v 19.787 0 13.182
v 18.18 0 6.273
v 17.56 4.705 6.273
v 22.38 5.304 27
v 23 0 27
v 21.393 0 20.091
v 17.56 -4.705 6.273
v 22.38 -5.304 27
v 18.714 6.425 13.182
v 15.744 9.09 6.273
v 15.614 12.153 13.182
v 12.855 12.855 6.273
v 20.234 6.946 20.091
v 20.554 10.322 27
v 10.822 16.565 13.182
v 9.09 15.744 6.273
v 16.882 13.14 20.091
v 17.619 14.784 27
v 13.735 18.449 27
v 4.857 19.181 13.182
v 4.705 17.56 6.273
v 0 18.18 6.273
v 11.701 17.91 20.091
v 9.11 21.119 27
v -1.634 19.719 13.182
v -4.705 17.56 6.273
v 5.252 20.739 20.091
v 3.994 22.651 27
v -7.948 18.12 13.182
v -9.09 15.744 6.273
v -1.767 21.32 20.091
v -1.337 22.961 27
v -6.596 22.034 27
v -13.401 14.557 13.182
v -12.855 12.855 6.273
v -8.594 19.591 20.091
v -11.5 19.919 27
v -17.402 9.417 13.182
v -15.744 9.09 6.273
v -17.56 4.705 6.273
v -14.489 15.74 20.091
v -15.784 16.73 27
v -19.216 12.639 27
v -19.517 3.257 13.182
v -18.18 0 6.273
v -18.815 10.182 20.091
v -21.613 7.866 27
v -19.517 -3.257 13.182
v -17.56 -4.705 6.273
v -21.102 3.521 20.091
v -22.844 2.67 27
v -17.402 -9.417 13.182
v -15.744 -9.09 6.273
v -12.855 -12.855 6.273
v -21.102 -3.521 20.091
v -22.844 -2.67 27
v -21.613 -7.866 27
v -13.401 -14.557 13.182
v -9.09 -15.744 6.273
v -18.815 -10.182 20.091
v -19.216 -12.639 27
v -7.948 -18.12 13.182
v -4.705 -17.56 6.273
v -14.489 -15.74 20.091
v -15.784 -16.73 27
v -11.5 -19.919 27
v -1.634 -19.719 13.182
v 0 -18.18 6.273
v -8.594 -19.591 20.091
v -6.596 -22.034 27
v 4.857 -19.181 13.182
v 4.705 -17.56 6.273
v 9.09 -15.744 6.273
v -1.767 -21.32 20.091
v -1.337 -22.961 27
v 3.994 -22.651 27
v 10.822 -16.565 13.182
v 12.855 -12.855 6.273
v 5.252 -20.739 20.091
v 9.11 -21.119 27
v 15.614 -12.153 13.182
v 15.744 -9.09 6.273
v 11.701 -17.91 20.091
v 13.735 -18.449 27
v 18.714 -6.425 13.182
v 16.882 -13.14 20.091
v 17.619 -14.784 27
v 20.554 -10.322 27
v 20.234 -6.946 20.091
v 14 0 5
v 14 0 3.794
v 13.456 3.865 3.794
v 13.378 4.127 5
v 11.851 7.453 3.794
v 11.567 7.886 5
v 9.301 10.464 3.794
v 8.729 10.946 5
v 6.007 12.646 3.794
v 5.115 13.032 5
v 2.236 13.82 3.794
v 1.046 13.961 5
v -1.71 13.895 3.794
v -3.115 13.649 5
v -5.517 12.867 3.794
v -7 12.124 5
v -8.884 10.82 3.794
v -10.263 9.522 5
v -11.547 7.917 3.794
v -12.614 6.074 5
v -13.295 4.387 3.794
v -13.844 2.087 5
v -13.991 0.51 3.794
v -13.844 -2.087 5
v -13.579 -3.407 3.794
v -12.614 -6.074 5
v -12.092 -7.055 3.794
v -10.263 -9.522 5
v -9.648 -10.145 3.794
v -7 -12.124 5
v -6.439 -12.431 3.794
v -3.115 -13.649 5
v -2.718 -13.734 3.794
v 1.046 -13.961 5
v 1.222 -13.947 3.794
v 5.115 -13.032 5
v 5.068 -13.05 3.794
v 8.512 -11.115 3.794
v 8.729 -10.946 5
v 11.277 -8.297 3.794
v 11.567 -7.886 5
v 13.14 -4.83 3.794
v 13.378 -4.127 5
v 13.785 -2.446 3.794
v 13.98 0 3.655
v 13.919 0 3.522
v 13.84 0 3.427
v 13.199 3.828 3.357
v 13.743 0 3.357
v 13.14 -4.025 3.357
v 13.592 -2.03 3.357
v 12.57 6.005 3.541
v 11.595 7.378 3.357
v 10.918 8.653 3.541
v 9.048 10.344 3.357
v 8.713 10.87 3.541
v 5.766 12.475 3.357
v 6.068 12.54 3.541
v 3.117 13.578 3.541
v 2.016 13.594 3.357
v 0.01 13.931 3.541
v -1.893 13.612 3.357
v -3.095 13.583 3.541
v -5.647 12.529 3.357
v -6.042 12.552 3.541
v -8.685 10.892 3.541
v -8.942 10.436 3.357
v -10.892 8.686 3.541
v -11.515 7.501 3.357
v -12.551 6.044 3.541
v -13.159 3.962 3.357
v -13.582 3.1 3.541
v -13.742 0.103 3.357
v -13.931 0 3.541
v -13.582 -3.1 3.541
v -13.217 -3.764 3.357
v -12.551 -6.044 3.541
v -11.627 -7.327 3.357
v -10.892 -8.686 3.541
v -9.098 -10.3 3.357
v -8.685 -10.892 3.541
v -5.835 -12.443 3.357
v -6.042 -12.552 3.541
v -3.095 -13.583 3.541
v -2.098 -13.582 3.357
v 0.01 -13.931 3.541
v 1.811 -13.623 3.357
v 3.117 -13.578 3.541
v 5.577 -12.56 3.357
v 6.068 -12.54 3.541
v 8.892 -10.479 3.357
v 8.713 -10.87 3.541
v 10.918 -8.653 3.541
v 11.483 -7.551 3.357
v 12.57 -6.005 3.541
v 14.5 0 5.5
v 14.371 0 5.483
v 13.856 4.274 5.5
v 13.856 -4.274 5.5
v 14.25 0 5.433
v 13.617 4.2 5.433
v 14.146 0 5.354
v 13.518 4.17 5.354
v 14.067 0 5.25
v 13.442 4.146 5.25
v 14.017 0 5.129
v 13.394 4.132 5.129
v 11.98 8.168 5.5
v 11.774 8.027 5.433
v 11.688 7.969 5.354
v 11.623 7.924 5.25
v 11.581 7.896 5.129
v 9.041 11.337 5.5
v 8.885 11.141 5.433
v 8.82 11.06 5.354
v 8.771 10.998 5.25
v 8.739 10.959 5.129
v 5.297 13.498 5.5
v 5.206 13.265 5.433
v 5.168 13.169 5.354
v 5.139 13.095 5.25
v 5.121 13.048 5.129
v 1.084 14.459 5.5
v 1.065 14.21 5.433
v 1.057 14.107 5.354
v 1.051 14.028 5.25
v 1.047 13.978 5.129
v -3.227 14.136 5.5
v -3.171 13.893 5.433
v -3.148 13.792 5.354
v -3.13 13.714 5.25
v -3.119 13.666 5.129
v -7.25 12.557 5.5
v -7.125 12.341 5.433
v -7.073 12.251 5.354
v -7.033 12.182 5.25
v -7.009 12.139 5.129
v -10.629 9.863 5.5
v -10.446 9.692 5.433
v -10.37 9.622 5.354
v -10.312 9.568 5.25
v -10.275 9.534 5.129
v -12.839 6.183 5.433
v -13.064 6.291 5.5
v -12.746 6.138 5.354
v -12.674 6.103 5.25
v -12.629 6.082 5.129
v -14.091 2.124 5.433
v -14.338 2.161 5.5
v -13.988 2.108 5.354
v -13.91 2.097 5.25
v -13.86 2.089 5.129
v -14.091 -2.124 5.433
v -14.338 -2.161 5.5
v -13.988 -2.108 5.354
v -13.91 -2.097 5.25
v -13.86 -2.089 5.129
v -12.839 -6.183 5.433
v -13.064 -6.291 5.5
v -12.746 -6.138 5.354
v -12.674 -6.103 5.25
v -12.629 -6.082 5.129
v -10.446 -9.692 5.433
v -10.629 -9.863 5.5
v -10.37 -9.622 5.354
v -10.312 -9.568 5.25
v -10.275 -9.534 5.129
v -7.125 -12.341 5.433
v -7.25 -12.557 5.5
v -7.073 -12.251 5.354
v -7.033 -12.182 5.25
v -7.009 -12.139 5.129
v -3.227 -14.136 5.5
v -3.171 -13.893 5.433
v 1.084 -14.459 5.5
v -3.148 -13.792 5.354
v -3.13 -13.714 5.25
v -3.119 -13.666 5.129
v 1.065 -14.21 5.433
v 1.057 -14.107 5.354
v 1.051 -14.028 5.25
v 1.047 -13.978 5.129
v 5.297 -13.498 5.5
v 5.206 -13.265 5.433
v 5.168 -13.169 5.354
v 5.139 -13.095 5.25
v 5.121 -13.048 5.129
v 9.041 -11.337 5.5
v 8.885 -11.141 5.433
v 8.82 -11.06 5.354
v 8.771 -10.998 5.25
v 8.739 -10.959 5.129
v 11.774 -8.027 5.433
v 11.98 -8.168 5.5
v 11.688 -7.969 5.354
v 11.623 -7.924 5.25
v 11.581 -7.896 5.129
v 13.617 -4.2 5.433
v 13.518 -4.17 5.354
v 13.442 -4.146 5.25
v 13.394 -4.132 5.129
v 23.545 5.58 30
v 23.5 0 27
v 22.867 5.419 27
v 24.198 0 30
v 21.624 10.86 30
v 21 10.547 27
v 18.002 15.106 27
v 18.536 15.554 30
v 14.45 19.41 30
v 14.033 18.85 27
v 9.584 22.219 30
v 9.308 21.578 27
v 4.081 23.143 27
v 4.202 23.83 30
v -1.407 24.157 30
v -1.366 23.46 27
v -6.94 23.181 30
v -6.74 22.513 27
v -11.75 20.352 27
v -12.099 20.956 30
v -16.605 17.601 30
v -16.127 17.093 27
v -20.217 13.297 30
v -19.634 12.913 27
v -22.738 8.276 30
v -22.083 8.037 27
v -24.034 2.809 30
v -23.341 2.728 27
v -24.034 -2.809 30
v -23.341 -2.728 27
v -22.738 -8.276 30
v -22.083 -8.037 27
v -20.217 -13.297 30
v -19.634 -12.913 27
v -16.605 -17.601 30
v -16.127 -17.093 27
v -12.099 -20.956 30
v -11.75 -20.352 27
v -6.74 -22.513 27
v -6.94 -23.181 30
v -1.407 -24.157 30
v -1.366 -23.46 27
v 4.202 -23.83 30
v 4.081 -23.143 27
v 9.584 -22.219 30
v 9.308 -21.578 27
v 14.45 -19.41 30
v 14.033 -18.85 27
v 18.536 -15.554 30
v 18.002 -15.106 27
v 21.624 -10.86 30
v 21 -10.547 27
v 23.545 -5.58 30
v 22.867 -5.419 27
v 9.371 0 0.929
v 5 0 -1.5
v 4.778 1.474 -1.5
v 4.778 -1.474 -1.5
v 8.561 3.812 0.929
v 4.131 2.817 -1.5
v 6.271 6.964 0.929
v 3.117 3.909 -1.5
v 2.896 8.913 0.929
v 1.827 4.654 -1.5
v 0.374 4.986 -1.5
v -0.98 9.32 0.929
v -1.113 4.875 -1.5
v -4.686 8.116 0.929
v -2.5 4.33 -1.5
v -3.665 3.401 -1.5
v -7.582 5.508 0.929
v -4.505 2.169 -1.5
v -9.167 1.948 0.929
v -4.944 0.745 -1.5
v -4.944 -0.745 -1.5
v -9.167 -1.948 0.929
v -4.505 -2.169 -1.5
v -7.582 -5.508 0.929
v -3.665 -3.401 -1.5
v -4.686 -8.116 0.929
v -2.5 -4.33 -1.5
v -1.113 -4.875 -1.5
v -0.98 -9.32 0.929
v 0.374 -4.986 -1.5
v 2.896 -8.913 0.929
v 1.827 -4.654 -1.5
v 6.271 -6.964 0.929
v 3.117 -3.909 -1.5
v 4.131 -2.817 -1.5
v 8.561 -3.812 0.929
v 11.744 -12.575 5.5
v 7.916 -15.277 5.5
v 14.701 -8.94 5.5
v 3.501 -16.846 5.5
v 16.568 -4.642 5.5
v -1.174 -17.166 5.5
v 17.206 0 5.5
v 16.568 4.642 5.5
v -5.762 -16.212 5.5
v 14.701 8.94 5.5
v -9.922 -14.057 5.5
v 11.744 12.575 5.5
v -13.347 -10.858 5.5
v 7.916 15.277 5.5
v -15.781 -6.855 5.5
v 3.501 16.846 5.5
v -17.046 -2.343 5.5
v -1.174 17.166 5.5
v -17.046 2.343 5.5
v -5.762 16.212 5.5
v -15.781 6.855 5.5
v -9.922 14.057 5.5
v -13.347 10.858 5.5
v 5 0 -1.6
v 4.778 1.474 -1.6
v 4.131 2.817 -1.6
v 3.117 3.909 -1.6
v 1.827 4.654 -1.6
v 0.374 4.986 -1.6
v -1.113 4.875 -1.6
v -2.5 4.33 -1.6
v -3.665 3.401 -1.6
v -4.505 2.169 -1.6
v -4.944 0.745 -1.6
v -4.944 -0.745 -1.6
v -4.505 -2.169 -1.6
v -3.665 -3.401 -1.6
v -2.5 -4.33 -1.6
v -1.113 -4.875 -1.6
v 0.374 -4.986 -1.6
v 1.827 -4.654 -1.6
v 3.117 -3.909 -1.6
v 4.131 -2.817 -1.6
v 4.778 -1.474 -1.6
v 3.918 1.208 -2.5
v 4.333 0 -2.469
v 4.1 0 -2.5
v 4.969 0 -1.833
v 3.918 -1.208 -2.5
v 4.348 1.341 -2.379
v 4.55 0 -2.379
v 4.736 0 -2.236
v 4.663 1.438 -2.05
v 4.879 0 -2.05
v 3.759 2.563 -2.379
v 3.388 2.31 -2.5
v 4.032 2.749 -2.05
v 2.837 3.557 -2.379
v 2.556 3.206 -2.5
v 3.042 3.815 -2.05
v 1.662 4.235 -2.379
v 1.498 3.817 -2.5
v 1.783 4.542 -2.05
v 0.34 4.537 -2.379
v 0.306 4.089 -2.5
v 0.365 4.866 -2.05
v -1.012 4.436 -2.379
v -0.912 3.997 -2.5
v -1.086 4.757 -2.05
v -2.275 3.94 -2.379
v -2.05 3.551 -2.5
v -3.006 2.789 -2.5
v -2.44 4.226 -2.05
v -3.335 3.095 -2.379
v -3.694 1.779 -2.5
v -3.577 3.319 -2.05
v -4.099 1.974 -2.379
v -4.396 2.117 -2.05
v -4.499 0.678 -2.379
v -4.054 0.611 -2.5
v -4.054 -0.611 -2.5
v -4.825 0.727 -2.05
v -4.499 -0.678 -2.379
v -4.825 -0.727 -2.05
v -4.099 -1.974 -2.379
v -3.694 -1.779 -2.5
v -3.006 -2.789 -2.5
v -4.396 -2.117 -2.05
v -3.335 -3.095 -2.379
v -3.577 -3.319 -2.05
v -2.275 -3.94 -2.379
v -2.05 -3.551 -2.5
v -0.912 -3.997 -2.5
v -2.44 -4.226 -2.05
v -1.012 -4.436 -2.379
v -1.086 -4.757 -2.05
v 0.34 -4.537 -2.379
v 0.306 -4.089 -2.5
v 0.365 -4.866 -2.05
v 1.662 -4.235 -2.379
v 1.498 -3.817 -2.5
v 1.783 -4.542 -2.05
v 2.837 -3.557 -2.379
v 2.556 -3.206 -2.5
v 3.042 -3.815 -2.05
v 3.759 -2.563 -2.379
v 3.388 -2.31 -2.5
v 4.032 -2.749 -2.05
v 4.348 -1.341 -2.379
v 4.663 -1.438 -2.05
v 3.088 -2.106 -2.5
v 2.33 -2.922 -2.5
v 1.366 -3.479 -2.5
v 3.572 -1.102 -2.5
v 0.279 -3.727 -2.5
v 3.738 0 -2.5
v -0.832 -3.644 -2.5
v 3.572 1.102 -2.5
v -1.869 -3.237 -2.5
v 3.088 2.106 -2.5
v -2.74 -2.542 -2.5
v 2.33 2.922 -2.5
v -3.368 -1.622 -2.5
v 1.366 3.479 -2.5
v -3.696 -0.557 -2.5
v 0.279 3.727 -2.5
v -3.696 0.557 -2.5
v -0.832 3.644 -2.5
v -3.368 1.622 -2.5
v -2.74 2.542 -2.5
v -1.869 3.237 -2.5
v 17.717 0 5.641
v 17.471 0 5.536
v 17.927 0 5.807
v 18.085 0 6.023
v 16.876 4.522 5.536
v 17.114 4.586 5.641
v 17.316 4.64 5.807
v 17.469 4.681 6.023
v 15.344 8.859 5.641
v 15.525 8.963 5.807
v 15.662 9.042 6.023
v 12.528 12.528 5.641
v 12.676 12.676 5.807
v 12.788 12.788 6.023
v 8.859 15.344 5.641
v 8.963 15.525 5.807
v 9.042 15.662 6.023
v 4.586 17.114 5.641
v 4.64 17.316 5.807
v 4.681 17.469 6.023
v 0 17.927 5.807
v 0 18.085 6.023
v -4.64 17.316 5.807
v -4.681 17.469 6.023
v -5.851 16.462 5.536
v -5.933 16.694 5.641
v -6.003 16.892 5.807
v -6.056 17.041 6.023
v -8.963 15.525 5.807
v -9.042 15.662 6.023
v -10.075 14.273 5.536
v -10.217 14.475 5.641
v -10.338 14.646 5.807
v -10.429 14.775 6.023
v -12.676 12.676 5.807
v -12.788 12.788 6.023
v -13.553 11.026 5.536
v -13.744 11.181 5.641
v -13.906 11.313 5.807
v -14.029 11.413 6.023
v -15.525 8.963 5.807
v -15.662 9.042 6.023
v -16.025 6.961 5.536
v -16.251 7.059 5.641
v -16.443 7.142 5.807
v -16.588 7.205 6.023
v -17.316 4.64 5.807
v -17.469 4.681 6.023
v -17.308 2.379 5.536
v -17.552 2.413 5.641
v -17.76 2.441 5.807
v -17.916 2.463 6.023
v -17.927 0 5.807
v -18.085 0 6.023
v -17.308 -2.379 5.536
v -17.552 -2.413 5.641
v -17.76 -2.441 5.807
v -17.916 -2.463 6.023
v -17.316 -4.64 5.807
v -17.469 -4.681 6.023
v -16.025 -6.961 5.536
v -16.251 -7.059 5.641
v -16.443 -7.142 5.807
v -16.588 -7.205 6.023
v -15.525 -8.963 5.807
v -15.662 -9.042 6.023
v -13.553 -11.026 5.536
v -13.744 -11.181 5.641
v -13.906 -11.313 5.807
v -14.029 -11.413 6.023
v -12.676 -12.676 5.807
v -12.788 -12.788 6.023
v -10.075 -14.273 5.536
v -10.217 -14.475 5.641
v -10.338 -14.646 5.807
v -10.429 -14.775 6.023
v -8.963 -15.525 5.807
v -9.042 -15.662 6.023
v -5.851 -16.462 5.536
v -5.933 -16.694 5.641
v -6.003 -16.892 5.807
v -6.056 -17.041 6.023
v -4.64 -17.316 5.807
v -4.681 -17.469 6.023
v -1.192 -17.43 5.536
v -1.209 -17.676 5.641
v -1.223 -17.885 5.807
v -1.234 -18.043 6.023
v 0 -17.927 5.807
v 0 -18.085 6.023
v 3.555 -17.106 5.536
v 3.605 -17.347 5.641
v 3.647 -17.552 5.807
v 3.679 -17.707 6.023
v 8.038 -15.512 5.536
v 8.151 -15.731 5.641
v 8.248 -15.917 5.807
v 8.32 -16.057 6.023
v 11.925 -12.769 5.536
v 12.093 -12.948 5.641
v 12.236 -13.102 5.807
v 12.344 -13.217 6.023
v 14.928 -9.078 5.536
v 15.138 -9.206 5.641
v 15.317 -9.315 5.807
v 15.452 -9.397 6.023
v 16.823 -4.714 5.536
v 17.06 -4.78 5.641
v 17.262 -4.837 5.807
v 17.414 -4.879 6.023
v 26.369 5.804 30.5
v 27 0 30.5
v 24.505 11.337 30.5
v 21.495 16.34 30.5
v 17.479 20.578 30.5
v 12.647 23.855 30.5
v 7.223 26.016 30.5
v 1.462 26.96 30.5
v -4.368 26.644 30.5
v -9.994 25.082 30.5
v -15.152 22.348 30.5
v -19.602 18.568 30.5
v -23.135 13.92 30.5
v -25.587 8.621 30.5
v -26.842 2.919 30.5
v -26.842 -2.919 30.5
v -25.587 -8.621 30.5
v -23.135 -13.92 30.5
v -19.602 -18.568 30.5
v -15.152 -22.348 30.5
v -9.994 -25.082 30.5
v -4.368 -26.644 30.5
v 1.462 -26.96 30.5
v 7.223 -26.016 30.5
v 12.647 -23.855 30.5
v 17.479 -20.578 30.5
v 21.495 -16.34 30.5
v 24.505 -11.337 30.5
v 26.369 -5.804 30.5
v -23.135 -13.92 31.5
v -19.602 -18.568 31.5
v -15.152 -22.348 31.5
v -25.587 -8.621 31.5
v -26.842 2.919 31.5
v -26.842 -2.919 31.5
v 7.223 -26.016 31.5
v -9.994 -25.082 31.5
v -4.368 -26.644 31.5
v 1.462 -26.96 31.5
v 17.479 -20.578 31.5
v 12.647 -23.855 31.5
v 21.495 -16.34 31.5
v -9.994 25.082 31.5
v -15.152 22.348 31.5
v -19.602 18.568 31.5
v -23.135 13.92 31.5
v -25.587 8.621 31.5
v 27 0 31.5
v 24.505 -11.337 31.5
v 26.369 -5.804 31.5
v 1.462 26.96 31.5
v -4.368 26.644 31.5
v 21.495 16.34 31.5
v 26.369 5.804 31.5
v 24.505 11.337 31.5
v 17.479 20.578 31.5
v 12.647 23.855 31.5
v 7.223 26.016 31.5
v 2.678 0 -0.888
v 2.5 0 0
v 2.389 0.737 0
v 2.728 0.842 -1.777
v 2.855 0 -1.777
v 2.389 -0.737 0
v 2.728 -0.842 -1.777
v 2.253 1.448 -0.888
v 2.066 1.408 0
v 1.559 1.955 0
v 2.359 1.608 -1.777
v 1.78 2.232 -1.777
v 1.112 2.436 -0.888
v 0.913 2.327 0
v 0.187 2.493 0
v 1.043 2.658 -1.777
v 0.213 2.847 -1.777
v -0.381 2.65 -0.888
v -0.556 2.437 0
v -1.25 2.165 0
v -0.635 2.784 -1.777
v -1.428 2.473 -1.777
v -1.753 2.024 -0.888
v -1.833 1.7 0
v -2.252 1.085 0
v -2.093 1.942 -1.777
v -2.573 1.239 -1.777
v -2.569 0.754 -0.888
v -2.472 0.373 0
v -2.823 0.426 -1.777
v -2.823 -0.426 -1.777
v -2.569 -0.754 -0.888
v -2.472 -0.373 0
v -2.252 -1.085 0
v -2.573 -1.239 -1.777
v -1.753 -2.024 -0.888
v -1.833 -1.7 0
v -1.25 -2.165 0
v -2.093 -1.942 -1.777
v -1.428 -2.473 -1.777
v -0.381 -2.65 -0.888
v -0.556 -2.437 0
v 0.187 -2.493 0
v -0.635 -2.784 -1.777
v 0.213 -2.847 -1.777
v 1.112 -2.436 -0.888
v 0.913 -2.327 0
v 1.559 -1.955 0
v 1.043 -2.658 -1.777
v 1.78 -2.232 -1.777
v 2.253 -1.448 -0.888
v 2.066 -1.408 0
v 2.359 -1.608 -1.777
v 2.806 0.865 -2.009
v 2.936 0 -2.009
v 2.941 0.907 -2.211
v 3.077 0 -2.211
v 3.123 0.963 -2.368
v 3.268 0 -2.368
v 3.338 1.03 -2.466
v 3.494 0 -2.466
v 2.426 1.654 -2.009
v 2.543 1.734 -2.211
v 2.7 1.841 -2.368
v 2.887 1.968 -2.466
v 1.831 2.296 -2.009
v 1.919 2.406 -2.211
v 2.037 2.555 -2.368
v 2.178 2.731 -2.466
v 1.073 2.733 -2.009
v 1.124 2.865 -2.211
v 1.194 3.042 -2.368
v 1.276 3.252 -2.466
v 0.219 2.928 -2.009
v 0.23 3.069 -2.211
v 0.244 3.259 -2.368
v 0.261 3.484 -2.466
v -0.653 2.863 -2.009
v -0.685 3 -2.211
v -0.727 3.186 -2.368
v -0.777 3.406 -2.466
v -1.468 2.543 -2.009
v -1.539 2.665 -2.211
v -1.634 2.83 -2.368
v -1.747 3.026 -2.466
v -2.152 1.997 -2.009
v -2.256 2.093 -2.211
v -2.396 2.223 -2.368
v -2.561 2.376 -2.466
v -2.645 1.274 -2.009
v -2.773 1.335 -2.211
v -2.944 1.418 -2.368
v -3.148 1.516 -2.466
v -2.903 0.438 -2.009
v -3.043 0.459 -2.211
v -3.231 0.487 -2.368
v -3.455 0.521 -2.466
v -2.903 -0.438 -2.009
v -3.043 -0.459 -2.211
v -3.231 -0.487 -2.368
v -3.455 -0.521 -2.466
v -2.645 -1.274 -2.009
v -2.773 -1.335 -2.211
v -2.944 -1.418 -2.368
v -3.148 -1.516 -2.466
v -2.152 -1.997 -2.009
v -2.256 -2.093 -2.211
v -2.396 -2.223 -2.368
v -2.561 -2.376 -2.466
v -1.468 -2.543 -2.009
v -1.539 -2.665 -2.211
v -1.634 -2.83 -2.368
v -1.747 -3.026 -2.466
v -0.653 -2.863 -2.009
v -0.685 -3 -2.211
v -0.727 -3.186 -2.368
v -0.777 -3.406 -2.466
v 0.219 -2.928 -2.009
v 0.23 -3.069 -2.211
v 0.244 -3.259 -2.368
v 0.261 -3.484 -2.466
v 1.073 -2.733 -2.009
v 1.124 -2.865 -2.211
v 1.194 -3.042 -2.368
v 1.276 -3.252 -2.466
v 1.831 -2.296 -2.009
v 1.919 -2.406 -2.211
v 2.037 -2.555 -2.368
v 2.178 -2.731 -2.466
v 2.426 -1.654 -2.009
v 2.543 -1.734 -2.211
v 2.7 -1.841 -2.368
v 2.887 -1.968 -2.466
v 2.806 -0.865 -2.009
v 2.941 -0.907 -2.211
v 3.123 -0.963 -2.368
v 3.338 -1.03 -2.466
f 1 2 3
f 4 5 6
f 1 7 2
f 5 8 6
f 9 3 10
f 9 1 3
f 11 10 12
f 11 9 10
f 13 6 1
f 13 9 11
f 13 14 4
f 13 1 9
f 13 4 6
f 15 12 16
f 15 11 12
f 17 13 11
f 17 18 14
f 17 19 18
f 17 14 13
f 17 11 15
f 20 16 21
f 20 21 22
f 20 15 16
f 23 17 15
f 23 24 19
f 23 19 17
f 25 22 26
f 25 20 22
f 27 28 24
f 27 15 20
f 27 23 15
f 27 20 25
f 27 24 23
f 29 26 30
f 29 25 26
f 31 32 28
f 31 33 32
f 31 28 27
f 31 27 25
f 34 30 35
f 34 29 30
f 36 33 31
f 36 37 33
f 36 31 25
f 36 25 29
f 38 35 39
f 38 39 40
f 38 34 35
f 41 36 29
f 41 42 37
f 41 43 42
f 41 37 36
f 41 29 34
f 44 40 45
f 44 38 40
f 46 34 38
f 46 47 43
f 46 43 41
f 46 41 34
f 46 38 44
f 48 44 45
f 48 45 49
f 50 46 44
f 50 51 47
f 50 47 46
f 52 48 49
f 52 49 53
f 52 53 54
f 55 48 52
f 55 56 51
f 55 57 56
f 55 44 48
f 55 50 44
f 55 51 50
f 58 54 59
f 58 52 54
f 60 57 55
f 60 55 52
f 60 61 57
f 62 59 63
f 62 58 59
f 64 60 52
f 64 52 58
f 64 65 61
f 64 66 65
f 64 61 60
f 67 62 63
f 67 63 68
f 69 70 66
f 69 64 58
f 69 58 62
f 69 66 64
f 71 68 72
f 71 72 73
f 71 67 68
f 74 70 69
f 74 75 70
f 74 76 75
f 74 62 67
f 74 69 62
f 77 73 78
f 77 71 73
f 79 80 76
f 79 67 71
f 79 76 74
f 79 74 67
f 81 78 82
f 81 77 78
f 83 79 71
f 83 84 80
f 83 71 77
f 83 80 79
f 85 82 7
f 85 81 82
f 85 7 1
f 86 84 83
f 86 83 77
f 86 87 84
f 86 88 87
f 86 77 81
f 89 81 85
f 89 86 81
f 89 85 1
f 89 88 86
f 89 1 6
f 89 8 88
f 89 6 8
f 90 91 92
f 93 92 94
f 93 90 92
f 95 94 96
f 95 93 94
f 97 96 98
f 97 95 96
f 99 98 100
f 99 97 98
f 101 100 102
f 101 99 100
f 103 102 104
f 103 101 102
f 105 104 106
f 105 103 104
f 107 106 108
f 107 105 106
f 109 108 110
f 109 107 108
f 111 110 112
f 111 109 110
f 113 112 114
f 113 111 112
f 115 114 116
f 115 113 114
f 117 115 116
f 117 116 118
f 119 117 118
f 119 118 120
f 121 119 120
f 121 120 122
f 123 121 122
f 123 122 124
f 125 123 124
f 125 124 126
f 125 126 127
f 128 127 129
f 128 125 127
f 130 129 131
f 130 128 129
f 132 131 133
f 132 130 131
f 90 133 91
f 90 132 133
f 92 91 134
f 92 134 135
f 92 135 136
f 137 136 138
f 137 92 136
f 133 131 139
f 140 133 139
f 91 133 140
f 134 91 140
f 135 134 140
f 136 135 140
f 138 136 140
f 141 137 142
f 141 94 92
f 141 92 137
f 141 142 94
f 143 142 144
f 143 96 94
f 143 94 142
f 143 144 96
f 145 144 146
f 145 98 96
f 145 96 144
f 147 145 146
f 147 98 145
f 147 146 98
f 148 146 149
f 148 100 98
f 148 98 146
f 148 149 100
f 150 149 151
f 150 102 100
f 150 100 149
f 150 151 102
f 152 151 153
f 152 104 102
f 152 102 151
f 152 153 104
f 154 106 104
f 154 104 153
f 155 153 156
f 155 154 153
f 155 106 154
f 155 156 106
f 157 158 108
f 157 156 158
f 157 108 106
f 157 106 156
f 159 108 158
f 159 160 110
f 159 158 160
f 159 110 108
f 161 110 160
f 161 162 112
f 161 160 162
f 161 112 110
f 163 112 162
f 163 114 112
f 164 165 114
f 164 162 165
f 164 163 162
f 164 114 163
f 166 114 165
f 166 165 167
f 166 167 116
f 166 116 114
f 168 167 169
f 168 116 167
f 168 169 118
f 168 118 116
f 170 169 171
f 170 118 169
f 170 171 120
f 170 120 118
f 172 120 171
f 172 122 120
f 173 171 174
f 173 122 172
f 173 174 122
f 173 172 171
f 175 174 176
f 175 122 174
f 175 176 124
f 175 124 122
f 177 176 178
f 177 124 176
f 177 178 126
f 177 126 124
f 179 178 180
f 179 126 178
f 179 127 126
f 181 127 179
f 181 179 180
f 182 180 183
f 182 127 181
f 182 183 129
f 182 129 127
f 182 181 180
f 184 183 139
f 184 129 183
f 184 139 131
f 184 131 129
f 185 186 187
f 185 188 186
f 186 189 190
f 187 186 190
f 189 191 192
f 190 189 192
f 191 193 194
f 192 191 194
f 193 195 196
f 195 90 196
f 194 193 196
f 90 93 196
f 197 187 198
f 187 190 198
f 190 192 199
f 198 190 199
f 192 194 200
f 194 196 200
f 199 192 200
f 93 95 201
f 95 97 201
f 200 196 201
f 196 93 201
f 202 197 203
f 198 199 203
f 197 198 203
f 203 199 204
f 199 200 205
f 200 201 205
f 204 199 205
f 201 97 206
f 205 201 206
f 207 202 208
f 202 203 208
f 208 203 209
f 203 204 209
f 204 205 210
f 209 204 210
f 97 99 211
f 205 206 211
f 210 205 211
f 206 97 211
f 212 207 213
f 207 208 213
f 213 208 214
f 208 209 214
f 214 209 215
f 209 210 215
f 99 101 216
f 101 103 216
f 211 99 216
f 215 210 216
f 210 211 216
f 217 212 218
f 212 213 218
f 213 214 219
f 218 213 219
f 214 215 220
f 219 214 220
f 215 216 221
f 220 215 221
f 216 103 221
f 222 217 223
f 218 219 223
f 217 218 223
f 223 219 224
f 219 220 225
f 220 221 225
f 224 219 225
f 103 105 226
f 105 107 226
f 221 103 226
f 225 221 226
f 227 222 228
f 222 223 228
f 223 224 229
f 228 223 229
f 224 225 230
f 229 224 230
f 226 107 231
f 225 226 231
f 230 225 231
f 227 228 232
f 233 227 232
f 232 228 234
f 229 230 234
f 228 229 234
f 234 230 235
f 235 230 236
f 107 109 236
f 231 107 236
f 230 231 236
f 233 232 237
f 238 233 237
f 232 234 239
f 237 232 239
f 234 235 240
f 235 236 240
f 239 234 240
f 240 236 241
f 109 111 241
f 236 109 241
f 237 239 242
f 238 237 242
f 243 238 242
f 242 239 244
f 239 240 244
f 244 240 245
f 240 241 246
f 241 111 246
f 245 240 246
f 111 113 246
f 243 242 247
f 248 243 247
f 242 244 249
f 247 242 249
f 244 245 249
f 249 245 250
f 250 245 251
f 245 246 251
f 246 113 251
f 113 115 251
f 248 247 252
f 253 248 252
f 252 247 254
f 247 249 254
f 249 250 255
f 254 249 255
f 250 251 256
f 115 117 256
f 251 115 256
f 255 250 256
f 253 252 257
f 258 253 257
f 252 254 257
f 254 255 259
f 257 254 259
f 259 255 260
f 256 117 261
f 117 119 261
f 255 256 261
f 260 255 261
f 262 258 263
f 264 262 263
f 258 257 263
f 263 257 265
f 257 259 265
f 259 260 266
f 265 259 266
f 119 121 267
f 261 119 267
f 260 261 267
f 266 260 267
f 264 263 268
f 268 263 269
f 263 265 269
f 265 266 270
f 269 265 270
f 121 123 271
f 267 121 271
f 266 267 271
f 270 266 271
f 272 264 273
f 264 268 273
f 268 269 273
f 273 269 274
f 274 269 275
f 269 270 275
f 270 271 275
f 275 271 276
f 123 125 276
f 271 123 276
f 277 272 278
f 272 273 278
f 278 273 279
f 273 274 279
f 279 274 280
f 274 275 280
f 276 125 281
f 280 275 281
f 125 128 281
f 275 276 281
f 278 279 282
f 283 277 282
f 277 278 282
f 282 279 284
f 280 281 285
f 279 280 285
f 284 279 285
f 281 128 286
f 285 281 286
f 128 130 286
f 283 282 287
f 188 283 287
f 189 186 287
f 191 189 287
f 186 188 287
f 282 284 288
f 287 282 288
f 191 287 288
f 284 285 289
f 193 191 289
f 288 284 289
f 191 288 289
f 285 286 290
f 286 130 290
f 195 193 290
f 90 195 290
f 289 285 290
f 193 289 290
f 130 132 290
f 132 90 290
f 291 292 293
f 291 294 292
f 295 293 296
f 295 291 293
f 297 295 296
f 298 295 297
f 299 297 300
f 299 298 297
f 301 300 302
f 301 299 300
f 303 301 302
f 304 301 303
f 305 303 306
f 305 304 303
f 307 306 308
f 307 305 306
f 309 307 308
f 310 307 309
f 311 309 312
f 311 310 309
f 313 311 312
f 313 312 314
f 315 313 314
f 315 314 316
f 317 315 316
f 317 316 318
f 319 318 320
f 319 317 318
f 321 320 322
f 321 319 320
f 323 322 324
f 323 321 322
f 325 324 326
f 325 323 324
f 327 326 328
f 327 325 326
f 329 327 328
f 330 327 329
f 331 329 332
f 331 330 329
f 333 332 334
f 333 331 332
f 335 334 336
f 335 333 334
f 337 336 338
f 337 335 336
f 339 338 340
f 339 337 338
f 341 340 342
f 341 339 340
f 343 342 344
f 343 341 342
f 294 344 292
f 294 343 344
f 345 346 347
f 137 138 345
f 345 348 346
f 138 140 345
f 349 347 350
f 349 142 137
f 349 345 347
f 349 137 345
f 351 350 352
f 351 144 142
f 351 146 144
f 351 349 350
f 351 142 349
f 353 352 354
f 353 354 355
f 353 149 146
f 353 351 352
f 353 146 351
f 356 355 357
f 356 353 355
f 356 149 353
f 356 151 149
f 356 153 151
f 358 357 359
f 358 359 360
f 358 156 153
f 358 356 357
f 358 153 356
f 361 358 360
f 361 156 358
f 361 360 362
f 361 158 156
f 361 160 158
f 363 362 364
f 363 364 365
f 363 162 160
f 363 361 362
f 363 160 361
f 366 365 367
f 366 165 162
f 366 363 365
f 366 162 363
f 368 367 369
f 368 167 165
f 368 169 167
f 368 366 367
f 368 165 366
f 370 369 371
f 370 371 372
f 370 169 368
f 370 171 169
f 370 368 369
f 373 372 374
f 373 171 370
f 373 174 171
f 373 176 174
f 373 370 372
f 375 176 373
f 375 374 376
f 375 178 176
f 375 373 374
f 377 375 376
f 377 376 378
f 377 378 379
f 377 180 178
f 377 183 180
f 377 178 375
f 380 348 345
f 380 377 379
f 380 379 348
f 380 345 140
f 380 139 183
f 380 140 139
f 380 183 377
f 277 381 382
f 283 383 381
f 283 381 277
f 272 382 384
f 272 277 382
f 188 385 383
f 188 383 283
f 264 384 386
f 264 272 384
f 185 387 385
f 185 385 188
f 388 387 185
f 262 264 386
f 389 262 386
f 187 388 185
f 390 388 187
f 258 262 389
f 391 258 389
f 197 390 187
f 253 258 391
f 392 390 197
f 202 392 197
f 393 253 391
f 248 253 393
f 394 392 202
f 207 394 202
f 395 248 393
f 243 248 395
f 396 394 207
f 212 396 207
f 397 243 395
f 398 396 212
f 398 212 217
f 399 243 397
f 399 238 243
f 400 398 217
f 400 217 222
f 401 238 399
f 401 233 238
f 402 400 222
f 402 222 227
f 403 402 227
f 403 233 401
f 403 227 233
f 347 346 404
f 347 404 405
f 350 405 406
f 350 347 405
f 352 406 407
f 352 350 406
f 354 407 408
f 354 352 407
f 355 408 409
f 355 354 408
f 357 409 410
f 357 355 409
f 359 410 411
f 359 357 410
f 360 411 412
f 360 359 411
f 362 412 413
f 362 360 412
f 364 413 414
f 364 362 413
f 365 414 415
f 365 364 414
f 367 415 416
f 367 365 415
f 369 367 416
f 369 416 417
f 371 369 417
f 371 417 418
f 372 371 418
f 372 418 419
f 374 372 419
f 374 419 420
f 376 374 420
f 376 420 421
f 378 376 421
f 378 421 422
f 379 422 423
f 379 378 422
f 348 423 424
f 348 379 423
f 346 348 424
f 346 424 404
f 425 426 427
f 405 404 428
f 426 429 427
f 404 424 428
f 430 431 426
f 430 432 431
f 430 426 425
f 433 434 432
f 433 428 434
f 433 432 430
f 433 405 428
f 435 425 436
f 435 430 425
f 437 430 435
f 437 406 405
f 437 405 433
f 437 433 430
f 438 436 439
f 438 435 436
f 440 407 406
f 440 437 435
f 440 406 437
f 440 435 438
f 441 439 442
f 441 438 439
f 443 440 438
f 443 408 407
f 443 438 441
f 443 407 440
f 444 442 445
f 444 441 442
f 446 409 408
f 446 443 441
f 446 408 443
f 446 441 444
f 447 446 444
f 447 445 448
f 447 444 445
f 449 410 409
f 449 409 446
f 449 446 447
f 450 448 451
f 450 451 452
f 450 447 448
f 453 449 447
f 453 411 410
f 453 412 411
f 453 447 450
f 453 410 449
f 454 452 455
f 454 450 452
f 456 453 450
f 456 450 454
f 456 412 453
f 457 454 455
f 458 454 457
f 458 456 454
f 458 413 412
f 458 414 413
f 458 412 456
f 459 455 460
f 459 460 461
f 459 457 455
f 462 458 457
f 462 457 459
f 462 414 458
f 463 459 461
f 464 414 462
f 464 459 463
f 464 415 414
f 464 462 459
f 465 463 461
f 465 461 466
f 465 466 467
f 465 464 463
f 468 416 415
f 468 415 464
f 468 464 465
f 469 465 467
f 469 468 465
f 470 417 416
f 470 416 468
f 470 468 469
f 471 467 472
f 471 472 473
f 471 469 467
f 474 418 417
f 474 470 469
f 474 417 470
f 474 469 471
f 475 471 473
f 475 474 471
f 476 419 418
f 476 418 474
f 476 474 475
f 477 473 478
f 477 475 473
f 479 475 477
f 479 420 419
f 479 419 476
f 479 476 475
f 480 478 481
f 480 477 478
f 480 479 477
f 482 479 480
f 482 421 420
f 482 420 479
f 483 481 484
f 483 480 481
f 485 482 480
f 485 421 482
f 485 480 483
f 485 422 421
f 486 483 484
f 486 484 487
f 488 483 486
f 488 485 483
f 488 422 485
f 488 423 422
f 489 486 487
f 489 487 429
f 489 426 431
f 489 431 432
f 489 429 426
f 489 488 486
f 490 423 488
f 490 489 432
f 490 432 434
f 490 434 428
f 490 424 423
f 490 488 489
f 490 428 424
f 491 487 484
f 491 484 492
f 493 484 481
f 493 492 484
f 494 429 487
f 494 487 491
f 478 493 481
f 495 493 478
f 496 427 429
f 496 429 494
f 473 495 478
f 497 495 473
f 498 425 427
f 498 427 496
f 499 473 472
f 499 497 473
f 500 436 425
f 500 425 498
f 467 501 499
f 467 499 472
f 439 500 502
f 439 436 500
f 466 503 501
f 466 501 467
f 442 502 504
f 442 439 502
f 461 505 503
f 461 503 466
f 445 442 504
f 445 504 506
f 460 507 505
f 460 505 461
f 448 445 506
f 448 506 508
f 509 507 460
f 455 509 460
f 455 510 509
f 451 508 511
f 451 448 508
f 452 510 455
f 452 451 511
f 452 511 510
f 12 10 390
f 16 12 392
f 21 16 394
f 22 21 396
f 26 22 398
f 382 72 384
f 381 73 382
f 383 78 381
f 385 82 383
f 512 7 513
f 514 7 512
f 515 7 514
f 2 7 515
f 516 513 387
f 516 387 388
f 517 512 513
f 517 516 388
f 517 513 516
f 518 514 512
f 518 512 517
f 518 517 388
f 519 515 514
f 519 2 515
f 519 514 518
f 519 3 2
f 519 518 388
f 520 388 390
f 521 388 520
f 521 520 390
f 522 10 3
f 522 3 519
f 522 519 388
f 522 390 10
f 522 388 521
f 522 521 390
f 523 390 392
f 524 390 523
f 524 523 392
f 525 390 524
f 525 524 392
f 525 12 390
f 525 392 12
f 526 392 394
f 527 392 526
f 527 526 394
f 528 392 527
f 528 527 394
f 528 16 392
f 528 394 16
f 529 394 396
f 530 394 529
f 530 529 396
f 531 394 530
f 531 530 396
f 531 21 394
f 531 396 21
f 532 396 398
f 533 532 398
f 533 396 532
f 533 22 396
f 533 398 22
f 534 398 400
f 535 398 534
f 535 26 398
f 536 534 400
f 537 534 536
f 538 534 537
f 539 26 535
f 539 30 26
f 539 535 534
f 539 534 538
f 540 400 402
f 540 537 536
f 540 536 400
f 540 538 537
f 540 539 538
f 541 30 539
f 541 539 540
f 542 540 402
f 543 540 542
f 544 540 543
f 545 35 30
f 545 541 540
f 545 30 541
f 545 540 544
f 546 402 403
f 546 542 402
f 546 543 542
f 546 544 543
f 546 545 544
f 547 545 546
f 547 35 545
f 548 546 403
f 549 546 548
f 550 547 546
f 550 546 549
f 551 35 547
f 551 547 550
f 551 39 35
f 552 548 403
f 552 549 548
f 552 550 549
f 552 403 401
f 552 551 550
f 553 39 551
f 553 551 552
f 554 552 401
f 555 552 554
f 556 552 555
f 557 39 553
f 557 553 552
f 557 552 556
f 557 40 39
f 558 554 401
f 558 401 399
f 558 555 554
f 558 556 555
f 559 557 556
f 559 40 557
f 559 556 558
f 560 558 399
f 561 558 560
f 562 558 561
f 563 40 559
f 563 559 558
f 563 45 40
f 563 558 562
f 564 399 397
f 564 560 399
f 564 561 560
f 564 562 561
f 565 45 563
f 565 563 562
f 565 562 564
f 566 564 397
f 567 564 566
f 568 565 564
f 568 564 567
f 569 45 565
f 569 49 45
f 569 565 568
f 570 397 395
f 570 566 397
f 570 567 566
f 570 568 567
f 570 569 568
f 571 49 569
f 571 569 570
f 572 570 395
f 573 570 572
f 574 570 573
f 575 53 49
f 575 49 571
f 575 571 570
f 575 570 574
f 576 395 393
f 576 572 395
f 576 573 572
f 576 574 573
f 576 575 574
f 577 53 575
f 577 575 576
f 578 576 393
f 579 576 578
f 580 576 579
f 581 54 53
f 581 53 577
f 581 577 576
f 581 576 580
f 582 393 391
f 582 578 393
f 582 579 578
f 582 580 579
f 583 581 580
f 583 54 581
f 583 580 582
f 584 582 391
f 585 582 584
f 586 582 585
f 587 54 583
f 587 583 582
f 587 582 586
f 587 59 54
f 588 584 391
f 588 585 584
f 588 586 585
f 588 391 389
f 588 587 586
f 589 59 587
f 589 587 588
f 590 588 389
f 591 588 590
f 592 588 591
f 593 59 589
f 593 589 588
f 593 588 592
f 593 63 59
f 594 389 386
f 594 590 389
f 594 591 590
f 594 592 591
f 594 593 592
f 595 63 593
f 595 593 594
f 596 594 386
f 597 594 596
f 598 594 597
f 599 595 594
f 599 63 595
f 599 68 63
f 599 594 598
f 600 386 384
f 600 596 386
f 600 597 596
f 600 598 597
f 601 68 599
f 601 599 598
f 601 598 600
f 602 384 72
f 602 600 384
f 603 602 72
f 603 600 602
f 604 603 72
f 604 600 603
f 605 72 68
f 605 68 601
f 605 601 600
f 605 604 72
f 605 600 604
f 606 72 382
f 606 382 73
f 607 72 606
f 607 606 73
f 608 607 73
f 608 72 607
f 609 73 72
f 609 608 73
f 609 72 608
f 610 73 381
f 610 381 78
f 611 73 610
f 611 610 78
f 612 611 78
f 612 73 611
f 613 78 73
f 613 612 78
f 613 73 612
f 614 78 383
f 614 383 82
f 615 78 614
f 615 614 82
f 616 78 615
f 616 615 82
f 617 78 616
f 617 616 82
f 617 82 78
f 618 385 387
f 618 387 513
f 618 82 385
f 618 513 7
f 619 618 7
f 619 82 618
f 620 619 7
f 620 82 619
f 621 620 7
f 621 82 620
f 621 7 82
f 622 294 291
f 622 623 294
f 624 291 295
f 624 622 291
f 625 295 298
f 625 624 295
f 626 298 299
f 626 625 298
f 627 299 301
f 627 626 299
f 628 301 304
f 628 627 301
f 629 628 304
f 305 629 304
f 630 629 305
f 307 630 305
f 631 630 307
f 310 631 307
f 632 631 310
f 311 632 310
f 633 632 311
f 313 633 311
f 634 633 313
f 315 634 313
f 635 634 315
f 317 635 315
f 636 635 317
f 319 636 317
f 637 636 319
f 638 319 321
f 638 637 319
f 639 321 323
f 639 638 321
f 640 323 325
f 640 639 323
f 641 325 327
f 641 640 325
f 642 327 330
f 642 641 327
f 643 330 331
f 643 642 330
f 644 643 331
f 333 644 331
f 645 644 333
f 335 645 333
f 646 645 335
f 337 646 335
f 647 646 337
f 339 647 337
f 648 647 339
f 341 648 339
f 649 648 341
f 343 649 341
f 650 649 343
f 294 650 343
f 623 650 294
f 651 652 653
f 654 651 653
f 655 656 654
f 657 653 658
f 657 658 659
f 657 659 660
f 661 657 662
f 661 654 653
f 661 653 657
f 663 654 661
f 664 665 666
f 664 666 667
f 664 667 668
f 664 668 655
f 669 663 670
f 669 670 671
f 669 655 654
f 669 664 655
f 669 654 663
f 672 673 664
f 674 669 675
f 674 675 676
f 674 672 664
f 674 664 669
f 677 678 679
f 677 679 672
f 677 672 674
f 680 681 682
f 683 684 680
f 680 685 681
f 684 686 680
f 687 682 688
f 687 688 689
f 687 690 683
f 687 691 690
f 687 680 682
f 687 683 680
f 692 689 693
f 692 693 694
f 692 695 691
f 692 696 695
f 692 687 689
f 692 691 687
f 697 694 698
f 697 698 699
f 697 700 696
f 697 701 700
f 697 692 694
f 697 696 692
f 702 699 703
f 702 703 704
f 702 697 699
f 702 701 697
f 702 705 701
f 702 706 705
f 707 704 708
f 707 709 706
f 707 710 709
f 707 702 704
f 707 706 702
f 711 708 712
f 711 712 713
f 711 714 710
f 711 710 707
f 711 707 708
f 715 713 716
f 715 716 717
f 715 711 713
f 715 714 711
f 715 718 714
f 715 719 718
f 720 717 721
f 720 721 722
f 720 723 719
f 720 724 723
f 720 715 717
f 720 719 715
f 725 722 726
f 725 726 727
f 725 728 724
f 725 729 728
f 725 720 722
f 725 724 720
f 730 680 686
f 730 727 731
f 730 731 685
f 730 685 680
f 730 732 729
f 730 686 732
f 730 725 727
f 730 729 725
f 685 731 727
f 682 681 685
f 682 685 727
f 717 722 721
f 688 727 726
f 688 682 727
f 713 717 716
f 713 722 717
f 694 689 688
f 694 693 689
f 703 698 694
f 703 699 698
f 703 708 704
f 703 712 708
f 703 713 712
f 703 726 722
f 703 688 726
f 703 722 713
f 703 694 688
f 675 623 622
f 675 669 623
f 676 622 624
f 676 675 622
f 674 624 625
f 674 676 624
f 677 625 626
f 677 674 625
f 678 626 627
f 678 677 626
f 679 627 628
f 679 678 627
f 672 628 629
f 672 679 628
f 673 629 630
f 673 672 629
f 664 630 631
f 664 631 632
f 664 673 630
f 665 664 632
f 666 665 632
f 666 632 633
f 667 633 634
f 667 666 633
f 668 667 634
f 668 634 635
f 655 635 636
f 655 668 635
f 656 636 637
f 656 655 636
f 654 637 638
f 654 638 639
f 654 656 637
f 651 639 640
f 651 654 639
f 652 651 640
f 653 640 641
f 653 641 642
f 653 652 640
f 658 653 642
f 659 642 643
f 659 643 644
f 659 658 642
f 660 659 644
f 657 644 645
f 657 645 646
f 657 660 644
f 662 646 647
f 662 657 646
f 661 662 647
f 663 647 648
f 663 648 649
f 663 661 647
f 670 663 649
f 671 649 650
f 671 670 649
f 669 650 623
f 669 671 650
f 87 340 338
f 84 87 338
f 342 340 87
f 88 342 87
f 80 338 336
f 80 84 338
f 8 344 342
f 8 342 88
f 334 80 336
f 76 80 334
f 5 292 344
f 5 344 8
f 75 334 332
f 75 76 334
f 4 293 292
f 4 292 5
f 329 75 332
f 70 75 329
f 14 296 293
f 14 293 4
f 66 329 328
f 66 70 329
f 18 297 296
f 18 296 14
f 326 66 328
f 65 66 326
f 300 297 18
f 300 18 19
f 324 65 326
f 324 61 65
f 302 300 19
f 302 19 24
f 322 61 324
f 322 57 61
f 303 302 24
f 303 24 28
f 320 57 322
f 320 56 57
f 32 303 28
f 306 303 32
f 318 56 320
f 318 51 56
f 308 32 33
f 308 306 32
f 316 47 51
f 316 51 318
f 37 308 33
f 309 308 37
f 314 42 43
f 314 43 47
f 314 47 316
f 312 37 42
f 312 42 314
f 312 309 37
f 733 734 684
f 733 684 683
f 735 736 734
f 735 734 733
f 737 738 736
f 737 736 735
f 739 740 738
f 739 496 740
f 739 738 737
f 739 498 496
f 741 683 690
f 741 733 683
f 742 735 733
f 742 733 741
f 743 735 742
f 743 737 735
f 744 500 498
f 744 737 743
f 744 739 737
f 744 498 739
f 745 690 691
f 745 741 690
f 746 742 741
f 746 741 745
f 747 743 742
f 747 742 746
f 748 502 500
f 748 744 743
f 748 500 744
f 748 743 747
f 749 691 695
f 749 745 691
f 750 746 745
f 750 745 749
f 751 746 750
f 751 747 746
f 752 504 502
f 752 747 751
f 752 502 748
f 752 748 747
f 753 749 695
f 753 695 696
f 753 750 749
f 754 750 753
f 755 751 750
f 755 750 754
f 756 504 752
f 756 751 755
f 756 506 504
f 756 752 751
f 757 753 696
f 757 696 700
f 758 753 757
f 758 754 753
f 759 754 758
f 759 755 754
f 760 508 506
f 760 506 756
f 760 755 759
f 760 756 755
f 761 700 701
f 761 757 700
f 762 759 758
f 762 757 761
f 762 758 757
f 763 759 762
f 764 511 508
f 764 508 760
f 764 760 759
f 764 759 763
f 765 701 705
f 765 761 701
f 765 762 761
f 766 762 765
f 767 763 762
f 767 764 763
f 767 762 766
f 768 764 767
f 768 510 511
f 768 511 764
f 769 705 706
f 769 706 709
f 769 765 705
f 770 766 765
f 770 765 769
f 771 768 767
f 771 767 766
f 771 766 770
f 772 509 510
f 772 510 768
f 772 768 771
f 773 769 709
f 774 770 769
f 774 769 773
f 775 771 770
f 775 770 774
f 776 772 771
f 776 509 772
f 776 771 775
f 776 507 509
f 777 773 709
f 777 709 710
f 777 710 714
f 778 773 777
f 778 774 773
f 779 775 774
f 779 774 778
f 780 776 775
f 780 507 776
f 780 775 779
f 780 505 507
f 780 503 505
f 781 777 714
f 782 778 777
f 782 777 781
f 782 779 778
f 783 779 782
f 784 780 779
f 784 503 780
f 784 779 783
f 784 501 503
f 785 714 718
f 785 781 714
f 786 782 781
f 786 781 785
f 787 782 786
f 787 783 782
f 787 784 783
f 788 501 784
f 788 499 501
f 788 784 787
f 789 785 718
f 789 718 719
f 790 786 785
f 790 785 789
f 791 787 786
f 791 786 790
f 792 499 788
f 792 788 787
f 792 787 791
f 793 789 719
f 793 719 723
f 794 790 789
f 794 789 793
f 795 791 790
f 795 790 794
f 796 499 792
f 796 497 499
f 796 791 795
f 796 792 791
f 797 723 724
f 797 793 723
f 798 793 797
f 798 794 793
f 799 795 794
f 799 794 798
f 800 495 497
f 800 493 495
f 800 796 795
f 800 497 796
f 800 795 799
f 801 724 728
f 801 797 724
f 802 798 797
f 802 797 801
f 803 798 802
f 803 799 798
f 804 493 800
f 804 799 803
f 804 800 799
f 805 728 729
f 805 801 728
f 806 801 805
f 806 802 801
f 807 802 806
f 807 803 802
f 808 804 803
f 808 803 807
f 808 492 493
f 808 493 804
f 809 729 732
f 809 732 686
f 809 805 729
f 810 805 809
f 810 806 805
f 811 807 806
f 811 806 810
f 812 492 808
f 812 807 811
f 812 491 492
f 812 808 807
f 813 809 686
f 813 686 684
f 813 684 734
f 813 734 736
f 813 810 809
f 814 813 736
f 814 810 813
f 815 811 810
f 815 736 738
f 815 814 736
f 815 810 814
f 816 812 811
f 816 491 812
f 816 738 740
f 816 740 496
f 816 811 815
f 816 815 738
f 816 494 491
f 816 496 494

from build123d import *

# Parameters (mm, degrees)
FILLET_R    = 0.9
FILLET001_R = 1
FILLET002_R = 0.5


with BuildPart() as part:
    # Sketch → Revolution (revolve)
    with BuildSketch(Plane.XZ):
        Polygon((0, 0), (2.5, 0), (3, -2.5), (5, -2.5), (5, -1.5), (14, 3.5), (14, 5.5), (18, 5.5), (23, 27), (23.5, 27), (24.197674, 30), (27, 30.5), (27, 31.5), (0, 31.5), align=None)
    revolve(axis=Axis((0, 0, 0), (0, 0, 1)))

    # Fillet
    fillet_edges = [part.edges().sort_by_distance(p)[0] for p in [
        (-3, 0, -2.5),
        (-5, 0, -2.5),
    ]]
    fillet(fillet_edges, radius=FILLET_R)

    # Fillet001
    fillet001_edges = [part.edges().sort_by_distance(p)[0] for p in [
        (-18, 0, 5.5),
    ]]
    fillet(fillet001_edges, radius=FILLET001_R)

    # Fillet002
    fillet002_edges = [part.edges().sort_by_distance(p)[0] for p in [
        (-14, 0, 3.5),
        (-14, 0, 5.5),
    ]]
    fillet(fillet002_edges, radius=FILLET002_R)


solid = part.part
